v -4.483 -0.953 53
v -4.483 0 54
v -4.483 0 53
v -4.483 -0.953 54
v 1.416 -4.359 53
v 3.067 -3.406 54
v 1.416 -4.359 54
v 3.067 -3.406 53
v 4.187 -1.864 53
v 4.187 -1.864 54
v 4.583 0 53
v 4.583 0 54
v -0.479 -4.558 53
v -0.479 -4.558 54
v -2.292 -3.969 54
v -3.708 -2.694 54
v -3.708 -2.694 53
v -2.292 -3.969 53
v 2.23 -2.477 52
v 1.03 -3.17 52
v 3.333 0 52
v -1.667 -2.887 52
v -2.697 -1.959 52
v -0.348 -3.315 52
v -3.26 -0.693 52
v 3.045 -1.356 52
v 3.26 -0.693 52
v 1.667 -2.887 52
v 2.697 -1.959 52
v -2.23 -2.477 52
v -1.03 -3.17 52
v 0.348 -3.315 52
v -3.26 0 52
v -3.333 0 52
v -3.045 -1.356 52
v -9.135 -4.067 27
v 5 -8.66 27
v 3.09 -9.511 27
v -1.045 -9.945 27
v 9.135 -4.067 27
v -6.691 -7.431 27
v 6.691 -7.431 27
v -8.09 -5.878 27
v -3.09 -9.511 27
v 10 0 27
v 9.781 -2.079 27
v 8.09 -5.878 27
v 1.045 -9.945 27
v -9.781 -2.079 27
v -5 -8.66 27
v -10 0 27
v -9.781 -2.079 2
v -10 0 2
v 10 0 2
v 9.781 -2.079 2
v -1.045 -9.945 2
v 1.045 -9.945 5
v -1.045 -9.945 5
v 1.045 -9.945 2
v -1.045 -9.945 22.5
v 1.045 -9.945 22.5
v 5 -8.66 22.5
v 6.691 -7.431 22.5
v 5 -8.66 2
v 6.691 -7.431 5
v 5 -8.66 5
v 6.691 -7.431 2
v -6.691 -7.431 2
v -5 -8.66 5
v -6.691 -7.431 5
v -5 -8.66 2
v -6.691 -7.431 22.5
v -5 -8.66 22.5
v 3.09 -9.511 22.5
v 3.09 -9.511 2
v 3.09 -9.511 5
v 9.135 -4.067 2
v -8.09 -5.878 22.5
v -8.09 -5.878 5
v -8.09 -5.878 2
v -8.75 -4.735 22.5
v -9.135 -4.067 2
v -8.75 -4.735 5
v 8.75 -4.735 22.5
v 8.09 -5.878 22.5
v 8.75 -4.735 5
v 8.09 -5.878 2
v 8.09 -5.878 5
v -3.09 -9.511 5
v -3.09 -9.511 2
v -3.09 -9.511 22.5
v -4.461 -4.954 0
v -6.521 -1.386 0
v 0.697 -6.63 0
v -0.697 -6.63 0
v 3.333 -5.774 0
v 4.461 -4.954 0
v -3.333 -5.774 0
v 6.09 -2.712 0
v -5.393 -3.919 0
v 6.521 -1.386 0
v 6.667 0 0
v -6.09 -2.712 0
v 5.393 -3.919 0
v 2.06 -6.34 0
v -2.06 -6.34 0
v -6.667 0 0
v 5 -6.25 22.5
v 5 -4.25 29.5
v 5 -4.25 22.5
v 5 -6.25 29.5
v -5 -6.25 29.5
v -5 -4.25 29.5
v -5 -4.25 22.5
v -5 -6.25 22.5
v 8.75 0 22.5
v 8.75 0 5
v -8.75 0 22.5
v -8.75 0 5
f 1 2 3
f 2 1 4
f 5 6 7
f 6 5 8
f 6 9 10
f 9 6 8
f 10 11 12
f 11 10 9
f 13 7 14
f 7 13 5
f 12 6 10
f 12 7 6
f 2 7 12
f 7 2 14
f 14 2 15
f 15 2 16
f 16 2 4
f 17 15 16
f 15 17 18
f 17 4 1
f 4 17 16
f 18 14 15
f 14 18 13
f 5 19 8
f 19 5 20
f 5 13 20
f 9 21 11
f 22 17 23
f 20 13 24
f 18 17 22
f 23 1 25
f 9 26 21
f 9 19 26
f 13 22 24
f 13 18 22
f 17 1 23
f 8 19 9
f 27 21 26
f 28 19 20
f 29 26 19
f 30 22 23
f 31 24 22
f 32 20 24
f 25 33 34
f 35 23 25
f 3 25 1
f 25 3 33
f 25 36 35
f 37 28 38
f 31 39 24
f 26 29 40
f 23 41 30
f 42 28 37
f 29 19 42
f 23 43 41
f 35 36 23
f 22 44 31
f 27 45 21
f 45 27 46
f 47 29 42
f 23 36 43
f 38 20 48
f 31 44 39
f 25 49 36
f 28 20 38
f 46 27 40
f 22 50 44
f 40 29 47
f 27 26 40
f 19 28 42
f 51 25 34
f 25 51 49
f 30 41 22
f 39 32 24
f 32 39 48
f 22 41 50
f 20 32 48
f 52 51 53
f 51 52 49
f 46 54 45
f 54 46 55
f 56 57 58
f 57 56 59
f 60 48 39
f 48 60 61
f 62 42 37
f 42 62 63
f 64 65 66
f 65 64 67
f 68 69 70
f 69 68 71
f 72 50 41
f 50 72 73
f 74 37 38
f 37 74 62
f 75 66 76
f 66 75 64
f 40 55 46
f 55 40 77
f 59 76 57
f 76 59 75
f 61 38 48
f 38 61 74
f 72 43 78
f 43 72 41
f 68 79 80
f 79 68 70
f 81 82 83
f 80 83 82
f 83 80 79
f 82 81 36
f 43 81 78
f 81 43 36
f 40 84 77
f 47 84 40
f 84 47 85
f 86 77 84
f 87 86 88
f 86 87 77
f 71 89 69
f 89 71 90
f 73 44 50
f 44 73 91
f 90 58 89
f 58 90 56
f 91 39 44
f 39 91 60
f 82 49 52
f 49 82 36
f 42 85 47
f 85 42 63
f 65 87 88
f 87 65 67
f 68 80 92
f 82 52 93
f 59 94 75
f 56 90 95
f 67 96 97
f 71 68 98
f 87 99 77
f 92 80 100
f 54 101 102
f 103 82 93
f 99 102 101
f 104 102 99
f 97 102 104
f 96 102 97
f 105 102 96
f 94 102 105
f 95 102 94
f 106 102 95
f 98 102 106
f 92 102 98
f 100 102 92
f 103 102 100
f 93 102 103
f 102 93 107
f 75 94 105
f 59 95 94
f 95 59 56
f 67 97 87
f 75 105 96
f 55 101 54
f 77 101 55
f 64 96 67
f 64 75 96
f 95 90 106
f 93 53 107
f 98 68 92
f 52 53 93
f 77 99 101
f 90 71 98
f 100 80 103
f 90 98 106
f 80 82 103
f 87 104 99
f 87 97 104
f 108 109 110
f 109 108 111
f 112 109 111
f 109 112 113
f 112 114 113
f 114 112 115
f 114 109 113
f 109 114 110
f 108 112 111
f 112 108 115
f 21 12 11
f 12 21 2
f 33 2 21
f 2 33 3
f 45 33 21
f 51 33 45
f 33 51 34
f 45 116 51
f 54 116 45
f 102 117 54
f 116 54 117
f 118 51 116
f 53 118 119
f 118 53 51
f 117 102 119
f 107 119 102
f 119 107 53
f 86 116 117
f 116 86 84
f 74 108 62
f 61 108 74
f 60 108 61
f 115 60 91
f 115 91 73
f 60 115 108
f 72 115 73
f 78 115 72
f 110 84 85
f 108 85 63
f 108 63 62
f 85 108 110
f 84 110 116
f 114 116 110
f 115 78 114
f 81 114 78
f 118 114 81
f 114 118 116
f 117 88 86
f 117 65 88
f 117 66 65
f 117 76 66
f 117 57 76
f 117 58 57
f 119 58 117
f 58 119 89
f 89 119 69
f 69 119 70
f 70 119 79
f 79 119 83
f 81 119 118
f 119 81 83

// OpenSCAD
basic_opener("edan");


module basic_opener(letter, size=50) {
    coin_radius = 9;
    coin_height = 2;
    bottle_cap_height = size/50;
    bottle_cap_radius = size/15;
    bottle_neck_height = size/2;
    bottle_neck_radius = size/15;
    bottle_body_height = size/2;
    bottle_body_radius = size/5;
    bottle_base_height = size/25;
    bottle_base_radius = size/5;
    
    bottle_height = bottle_cap_height + bottle_neck_height + bottle_body_height + bottle_base_height;
    bottle_radius = bottle_body_radius;
    
    padding = 2.5;
        
    difference() {
        group(){
        translate([0,0,bottle_height]) cylinder(h=bottle_cap_height, r=bottle_neck_radius+padding/2); // bottle cap
        translate([0,0,bottle_height-bottle_cap_height]) cylinder(h=bottle_cap_height, r1=bottle_cap_radius, r2=bottle_neck_radius+padding/2); // bottle cap
        translate([0,0,bottle_body_height+bottle_base_height]) cylinder(h=bottle_neck_height, r1=bottle_body_radius, r2=bottle_neck_radius); // bottle neck
        translate([0,0,bottle_base_height]) cylinder(h=bottle_body_height, r=bottle_body_radius); // bottle body
        translate([0,0,0]) cylinder(h=bottle_base_height, r1=bottle_cap_radius*2, r2=bottle_body_radius); // bottle base
        }
        translate([-bottle_body_radius/2,-bottle_body_radius/2-padding/2,bottle_body_height-bottle_base_height-padding]) cube([10,coin_height,coin_radius]); // coin hole
        translate([-bottle_body_radius,0,-padding/2]) cube([bottle_body_radius*2,bottle_body_radius*2,bottle_height+padding]); // divide to half
        translate([-bottle_body_radius+padding/2,-bottle_body_radius,bottle_body_height/5]) cube([2*bottle_body_radius-padding,2*bottle_body_radius-padding,bottle_body_height*0.7]); // frame
        
        
    }
}
